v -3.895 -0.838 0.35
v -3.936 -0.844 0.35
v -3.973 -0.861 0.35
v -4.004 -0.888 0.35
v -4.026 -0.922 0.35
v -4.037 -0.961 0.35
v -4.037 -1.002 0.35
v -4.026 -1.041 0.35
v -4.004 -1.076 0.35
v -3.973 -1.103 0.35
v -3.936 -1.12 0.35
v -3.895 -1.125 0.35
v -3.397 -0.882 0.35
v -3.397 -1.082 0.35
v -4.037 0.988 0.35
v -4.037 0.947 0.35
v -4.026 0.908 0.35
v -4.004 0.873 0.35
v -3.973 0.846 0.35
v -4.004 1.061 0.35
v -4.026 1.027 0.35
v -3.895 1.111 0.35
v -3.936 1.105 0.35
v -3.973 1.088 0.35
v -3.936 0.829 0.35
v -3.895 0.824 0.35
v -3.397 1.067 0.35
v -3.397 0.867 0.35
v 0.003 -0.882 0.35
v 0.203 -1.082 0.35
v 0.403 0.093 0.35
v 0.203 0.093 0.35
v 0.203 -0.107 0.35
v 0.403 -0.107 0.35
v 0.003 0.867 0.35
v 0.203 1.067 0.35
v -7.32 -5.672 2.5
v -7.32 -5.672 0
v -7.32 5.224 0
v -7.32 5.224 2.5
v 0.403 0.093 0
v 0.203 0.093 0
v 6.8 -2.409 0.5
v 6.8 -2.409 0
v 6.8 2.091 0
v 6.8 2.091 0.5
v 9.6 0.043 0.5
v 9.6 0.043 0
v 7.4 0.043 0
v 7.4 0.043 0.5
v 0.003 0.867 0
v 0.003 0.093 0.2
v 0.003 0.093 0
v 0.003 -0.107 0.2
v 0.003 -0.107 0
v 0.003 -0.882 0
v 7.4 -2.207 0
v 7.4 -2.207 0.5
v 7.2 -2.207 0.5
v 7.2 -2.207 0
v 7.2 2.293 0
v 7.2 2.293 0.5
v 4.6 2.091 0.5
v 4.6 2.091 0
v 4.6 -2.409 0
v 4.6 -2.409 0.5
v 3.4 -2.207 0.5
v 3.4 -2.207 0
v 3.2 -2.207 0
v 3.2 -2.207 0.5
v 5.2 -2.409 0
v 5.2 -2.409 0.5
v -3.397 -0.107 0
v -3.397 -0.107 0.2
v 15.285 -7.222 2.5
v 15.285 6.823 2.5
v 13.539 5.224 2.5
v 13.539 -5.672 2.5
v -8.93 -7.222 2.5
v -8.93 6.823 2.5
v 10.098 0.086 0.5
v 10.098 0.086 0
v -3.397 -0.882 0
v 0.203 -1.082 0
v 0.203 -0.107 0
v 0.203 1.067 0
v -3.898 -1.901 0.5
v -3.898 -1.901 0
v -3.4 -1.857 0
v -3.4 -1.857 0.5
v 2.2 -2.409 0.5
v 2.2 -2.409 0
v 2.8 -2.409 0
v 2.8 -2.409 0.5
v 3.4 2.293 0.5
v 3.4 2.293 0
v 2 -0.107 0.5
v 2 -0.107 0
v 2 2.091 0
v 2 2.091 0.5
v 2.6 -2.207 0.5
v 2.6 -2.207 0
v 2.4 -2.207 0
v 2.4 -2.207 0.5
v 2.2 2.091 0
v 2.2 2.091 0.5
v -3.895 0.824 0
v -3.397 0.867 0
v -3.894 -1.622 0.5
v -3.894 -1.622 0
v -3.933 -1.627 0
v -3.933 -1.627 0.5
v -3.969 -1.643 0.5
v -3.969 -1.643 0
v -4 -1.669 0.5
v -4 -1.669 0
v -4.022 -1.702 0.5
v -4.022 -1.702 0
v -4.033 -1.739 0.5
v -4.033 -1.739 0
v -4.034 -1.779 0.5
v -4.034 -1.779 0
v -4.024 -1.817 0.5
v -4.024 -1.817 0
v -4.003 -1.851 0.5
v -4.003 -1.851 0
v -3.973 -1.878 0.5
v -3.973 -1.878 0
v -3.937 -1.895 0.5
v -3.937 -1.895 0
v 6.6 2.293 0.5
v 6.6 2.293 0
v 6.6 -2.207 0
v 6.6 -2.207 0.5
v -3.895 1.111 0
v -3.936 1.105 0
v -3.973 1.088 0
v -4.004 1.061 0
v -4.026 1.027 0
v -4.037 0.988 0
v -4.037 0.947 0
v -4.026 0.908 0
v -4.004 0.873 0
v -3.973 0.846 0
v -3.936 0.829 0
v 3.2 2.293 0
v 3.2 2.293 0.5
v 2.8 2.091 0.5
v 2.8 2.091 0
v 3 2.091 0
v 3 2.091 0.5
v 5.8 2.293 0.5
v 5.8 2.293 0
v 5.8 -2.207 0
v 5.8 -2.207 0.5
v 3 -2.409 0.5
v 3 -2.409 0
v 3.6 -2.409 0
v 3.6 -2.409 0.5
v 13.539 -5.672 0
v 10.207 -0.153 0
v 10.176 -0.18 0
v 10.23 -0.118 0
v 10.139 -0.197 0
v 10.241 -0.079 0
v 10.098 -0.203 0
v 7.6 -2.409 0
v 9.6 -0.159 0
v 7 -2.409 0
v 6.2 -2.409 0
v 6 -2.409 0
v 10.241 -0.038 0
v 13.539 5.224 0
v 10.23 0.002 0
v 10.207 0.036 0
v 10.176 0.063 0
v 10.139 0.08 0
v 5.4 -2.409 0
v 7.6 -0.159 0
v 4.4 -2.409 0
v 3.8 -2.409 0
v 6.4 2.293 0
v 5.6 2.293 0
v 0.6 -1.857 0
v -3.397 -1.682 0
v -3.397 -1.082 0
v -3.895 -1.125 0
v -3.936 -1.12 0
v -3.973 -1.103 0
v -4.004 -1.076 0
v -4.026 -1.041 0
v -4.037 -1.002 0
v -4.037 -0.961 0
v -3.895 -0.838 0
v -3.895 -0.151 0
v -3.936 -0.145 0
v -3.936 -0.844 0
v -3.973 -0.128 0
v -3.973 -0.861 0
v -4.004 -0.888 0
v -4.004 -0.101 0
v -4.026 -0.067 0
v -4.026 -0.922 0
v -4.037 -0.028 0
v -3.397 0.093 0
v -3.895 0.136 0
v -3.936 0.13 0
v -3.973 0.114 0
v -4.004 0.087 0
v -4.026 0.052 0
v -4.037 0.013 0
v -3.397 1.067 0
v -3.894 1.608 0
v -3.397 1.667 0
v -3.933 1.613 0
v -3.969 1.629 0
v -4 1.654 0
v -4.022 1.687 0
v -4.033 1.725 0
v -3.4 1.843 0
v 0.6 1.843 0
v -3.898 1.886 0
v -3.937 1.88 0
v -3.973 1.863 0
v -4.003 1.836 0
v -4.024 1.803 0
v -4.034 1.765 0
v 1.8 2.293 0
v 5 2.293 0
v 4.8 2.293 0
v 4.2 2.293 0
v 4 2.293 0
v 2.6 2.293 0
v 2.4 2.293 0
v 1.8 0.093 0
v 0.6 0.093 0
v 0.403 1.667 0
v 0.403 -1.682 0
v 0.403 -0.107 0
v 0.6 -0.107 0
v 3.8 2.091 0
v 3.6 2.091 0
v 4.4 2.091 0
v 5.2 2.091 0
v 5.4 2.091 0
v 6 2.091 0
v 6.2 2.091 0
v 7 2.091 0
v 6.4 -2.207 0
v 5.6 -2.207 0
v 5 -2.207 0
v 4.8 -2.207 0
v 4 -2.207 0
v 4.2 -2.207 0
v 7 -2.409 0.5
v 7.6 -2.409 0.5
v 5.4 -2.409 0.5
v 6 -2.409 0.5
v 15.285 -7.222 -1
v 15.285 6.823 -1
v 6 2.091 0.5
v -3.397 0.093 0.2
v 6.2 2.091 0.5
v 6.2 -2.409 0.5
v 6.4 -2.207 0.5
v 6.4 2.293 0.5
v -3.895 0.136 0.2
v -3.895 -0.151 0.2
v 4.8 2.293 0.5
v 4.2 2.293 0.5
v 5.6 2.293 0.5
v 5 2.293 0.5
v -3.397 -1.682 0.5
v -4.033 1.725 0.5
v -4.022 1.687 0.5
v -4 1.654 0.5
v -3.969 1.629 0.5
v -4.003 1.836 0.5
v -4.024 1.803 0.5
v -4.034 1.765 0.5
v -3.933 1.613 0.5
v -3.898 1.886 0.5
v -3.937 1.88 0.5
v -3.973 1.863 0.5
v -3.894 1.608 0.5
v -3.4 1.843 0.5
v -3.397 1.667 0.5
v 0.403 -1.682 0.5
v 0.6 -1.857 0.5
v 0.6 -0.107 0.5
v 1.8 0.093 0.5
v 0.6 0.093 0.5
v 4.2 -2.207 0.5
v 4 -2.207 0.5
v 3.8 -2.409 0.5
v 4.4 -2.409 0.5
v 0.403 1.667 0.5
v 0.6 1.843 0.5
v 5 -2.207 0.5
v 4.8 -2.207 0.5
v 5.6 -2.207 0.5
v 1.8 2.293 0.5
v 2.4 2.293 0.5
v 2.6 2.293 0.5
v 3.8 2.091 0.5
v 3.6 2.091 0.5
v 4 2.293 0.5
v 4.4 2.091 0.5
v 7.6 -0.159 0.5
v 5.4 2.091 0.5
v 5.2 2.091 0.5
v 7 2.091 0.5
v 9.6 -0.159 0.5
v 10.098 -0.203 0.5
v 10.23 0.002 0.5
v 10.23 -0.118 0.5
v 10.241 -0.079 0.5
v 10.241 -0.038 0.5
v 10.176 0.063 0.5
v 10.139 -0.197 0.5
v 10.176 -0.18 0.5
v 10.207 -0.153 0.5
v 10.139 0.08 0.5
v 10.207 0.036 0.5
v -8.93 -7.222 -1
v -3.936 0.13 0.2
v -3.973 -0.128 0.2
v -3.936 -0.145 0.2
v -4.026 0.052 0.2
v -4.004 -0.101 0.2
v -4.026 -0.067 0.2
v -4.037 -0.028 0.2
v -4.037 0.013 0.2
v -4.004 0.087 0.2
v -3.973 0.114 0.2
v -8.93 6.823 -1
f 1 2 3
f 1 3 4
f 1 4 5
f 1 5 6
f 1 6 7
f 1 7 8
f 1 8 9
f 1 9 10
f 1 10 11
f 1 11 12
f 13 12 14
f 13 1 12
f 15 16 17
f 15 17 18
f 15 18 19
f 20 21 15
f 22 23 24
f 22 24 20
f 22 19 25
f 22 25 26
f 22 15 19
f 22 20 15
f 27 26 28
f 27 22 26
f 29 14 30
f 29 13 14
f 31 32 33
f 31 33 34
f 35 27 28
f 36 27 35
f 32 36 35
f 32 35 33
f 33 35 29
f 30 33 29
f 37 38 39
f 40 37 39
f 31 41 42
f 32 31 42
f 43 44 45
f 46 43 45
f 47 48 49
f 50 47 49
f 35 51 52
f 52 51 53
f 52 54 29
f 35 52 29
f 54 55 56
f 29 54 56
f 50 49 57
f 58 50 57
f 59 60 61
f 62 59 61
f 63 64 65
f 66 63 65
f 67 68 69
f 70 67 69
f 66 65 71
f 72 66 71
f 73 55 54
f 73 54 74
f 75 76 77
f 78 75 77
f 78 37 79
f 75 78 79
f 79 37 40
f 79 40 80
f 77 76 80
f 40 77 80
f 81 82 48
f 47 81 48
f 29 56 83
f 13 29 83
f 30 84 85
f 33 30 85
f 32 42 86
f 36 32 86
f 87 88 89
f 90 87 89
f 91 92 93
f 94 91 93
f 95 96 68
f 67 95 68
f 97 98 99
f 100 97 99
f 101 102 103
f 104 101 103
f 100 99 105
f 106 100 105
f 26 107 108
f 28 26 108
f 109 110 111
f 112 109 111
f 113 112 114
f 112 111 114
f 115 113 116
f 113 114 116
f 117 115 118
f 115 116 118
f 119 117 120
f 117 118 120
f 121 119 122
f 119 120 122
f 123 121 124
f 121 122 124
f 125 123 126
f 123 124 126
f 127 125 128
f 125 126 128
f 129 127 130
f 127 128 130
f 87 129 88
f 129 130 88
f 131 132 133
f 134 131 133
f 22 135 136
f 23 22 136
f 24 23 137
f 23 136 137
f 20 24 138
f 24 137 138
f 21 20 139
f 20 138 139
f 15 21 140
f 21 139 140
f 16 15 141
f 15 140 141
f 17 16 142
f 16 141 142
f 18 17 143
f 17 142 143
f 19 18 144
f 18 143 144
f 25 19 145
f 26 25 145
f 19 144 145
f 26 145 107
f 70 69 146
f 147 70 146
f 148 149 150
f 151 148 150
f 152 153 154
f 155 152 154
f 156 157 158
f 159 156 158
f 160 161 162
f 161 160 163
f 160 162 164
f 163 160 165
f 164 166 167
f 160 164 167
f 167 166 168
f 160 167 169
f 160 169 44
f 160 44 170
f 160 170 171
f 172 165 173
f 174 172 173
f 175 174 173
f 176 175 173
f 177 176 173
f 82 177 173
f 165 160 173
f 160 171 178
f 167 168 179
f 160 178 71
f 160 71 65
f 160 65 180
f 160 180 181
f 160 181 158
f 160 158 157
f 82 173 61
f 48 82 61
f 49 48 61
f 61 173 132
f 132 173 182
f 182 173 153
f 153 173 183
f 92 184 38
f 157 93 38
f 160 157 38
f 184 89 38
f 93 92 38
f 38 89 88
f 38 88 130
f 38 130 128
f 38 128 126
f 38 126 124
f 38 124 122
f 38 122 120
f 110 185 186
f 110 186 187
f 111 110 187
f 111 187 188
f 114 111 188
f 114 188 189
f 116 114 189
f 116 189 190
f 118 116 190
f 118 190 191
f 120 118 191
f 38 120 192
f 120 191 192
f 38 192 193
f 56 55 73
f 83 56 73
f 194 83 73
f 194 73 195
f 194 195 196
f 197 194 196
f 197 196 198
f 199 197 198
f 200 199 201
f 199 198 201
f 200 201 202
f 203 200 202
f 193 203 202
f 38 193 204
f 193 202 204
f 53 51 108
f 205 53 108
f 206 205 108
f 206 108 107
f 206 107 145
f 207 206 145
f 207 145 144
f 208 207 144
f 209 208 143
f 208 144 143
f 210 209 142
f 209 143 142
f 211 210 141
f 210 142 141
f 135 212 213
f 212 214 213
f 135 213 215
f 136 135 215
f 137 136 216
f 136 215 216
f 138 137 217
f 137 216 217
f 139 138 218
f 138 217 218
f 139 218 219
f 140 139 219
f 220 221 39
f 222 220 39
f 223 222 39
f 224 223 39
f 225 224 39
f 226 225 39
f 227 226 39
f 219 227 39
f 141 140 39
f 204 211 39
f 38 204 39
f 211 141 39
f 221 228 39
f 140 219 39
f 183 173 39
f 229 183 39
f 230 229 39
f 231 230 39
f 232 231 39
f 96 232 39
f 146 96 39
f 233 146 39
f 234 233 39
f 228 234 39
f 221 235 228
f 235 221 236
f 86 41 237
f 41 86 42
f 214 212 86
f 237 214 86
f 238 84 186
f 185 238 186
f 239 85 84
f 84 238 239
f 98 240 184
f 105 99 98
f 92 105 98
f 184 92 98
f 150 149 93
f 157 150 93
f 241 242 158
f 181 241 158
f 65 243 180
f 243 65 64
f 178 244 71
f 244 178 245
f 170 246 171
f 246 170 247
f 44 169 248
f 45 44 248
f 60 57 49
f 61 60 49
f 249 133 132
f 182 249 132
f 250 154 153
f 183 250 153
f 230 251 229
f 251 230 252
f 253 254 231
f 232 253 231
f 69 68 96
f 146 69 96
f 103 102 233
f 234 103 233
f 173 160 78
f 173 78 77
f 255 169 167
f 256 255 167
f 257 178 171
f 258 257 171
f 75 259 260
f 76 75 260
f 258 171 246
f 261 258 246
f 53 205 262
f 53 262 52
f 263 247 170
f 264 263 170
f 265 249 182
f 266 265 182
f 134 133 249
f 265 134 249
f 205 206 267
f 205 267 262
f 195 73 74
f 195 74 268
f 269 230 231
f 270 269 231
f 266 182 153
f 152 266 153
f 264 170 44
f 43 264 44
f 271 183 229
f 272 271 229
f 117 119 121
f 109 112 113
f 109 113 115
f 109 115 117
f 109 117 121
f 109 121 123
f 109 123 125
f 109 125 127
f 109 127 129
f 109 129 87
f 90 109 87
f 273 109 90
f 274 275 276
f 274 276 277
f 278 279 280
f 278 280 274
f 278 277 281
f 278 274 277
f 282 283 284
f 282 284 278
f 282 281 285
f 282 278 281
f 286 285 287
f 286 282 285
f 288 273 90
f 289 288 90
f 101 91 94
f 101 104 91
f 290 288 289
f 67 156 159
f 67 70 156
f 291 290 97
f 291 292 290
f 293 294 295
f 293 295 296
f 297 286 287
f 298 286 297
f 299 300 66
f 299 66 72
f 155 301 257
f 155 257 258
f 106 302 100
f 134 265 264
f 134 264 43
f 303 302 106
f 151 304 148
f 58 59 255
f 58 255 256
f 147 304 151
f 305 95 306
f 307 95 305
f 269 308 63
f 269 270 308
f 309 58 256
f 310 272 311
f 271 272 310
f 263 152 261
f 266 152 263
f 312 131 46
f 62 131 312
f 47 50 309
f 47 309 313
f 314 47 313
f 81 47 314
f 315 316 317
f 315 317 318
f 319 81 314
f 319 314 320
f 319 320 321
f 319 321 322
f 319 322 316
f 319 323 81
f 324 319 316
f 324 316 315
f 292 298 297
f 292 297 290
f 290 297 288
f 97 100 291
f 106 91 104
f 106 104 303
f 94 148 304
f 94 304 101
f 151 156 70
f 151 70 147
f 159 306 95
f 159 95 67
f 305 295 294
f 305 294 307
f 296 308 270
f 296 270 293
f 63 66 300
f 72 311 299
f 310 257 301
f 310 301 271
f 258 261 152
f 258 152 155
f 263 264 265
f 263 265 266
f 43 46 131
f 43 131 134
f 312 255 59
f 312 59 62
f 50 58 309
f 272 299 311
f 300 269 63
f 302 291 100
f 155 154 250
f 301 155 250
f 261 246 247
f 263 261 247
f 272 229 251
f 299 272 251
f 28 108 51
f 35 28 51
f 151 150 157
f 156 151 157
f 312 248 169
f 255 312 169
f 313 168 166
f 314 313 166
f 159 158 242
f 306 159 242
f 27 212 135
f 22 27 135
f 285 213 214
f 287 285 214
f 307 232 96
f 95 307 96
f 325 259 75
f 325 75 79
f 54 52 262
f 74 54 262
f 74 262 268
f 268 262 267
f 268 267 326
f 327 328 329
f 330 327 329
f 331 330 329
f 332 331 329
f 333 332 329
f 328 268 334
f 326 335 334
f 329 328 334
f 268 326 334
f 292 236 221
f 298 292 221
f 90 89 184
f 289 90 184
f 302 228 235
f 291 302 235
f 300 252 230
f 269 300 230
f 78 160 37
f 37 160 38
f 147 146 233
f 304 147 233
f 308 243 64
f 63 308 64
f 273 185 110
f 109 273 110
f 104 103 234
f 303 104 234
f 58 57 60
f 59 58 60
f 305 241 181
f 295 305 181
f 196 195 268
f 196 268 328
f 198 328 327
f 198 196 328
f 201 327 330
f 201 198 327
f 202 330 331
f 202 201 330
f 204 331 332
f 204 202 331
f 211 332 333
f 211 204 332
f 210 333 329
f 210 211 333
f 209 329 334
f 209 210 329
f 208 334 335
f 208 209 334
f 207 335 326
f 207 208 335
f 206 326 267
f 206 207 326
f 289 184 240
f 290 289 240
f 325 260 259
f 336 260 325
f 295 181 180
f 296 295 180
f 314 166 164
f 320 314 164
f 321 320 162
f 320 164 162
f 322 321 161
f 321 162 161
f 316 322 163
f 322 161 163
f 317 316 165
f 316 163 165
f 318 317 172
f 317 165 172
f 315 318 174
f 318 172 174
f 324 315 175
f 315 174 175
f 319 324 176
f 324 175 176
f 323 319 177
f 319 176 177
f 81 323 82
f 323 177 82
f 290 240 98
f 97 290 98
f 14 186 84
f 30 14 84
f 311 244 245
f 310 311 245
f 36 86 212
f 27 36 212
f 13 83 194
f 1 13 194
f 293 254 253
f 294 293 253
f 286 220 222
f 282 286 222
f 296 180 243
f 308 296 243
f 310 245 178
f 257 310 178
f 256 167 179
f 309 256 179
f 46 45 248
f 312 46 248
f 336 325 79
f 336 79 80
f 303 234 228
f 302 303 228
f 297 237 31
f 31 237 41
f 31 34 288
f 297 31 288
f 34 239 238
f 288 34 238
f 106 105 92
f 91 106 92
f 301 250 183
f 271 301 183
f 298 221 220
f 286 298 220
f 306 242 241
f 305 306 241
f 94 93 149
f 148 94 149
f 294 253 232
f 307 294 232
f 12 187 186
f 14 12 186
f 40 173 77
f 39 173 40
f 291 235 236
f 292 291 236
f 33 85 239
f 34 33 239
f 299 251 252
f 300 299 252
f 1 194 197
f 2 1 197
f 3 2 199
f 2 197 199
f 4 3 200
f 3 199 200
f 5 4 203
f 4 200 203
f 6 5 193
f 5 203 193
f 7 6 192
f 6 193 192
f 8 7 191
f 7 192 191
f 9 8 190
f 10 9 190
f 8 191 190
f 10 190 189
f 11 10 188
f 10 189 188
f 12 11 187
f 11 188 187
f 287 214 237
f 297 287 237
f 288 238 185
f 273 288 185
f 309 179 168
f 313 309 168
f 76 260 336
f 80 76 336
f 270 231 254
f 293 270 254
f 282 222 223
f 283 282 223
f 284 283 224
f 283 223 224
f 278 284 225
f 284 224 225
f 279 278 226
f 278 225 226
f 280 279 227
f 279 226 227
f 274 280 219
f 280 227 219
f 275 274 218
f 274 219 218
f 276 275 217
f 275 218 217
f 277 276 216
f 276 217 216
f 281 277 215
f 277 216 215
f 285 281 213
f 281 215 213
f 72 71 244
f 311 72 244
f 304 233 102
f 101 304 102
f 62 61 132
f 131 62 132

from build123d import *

# Parameters (mm, degrees)
BOSS_EXTRUDE1_DEPTH = 0.2
BOSS_EXTRUDE2_DEPTH = 0.35
BOSS_EXTRUDE3_DEPTH = 0.5
SKETCH2_W           = 20.858957108
SKETCH2_H           = 10.895771928
BOSS_EXTRUDE4_DEPTH = 1
SKETCH3_W           = 24.214928457
SKETCH3_H           = 14.045107393
SKETCH3_W_2         = 20.858957108
SKETCH3_H_2         = 10.895771928
BOSS_EXTRUDE5_DEPTH = 3.5


with BuildPart() as part:
    # Sketch1 → Boss-Extrude1 (new body)
    with BuildSketch(Plane.XY):
        with BuildLine():
            Line((-3.397107478, 0.09272626), (0.002892522, 0.09272626))
            Line((0.002892522, 0.09272626), (0.002892522, -0.10727374))
            Line((0.002892522, -0.10727374), (-3.397107478, -0.10727374))
            Line((-3.397107478, -0.10727374), (-3.895204827, -0.150851611))
            ThreePointArc((-3.895204827, -0.150851611), (-4.038782699, -0.00727374), (-3.895204827, 0.136304132))
            Line((-3.895204827, 0.136304132), (-3.397107478, 0.09272626))
        make_face()
    extrude(amount=BOSS_EXTRUDE1_DEPTH)

    # Sketch1<4> → Boss-Extrude2 (add)
    with BuildSketch(Plane.XY):
        with BuildLine():
            Line((0.402892522, -0.10727374), (0.402892522, 0.09272626))
            Line((0.402892522, 0.09272626), (0.202892522, 0.09272626))
            Line((0.202892522, 0.09272626), (0.202892522, 1.067220881))
            Line((0.202892522, 1.067220881), (-3.397107478, 1.067220881))
            Line((-3.397107478, 1.067220881), (-3.895204827, 1.110798752))
            ThreePointArc((-3.895204827, 1.110798752), (-4.038782699, 0.967220881), (-3.895204827, 0.82364301))
            Line((-3.895204827, 0.82364301), (-3.397107478, 0.867220881))
            Line((-3.397107478, 0.867220881), (0.002892522, 0.867220881))
            Line((0.002892522, 0.867220881), (0.002892522, 0.09272626))
            Line((0.002892522, 0.09272626), (0.002892522, -0.10727374))
            Line((0.002892522, -0.10727374), (0.002892522, -0.881768361))
            Line((0.002892522, -0.881768361), (-3.397107478, -0.881768361))
            Line((-3.397107478, -0.881768361), (-3.895204827, -0.838190489))
            ThreePointArc((-3.895204827, -0.838190489), (-4.038782699, -0.981768361), (-3.895204827, -1.125346232))
            Line((-3.895204827, -1.125346232), (-3.397107478, -1.081768361))
            Line((-3.397107478, -1.081768361), (0.202892522, -1.081768361))
            Line((0.202892522, -1.081768361), (0.202892522, -0.10727374))
            Line((0.202892522, -0.10727374), (0.402892522, -0.10727374))
        make_face()
    extrude(amount=BOSS_EXTRUDE2_DEPTH)

    # Sketch1<5> → Boss-Extrude3 (add)
    with BuildSketch(Plane.XY):
        with BuildLine():
            Line((1.8, 0.09272626), (0.6, 0.09272626))
            Line((0.6, 0.09272626), (0.6, 1.84272626))
            Line((0.6, 1.84272626), (-3.4, 1.84272626))
            Line((-3.4, 1.84272626), (-3.898097349, 1.886304132))
            ThreePointArc((-3.898097349, 1.886304132), (-4.035149554, 1.744700475), (-3.893545897, 1.607648271))
            Line((-3.893545897, 1.607648271), (-3.397107478, 1.667220881))
            Line((-3.397107478, 1.667220881), (0.402892522, 1.667220881))
            Line((0.402892522, 1.667220881), (0.402892522, -1.681768361))
            Line((0.402892522, -1.681768361), (-3.397107478, -1.681768361))
            Line((-3.397107478, -1.681768361), (-3.893545897, -1.62219575))
            ThreePointArc((-3.893545897, -1.62219575), (-4.035149554, -1.759247955), (-3.898097349, -1.900851611))
            Line((-3.898097349, -1.900851611), (-3.4, -1.85727374))
            Line((-3.4, -1.85727374), (0.6, -1.85727374))
            Line((0.6, -1.85727374), (0.6, -0.10727374))
            Line((0.6, -0.10727374), (2, -0.10727374))
            Line((2, -0.10727374), (2, 2.090619677))
            Line((2, 2.090619677), (2.2, 2.090619677))
            Line((2.2, 2.090619677), (2.2, -2.409380323))
            Line((2.2, -2.409380323), (2.8, -2.409380323))
            Line((2.8, -2.409380323), (2.8, 2.090619677))
            Line((2.8, 2.090619677), (3, 2.090619677))
            Line((3, 2.090619677), (3, -2.409380323))
            Line((3, -2.409380323), (3.6, -2.409380323))
            Line((3.6, -2.409380323), (3.6, 2.090619677))
            Line((3.6, 2.090619677), (3.8, 2.090619677))
            Line((3.8, 2.090619677), (3.8, -2.409380323))
            Line((3.8, -2.409380323), (4.4, -2.409380323))
            Line((4.4, -2.409380323), (4.4, 2.090619677))
            Line((4.4, 2.090619677), (4.6, 2.090619677))
            Line((4.6, 2.090619677), (4.6, -2.409380323))
            Line((4.6, -2.409380323), (5.2, -2.409380323))
            Line((5.2, -2.409380323), (5.2, 2.090619677))
            Line((5.2, 2.090619677), (5.4, 2.090619677))
            Line((5.4, 2.090619677), (5.4, -2.409380323))
            Line((5.4, -2.409380323), (6, -2.409380323))
            Line((6, -2.409380323), (6, 2.090619677))
            Line((6, 2.090619677), (6.2, 2.090619677))
            Line((6.2, 2.090619677), (6.2, -2.409380323))
            Line((6.2, -2.409380323), (6.8, -2.409380323))
            Line((6.8, -2.409380323), (6.8, 2.090619677))
            Line((6.8, 2.090619677), (7, 2.090619677))
            Line((7, 2.090619677), (7, -2.409380323))
            Line((7, -2.409380323), (7.6, -2.409380323))
            Line((7.6, -2.409380323), (7.6, -0.159380323))
            Line((7.6, -0.159380323), (9.6, -0.159380323))
            Line((9.6, -0.159380323), (10.098097349, -0.202958194))
            ThreePointArc((10.098097349, -0.202958194), (10.242728512, -0.058327031), (10.098097349, 0.086304132))
            Line((10.098097349, 0.086304132), (9.6, 0.04272626))
            Line((9.6, 0.04272626), (7.4, 0.04272626))
            Line((7.4, 0.04272626), (7.4, -2.20727374))
            Line((7.4, -2.20727374), (7.2, -2.20727374))
            Line((7.2, -2.20727374), (7.2, 2.29272626))
            Line((7.2, 2.29272626), (6.6, 2.29272626))
            Line((6.6, 2.29272626), (6.6, -2.20727374))
            Line((6.6, -2.20727374), (6.4, -2.20727374))
            Line((6.4, -2.20727374), (6.4, 2.29272626))
            Line((6.4, 2.29272626), (5.8, 2.29272626))
            Line((5.8, 2.29272626), (5.8, -2.20727374))
            Line((5.8, -2.20727374), (5.6, -2.20727374))
            Line((5.6, -2.20727374), (5.6, 2.29272626))
            Line((5.6, 2.29272626), (5, 2.29272626))
            Line((5, 2.29272626), (5, -2.20727374))
            Line((5, -2.20727374), (4.8, -2.20727374))
            Line((4.8, -2.20727374), (4.8, 2.29272626))
            Line((4.8, 2.29272626), (4.2, 2.29272626))
            Line((4.2, 2.29272626), (4.2, -2.20727374))
            Line((4.2, -2.20727374), (4, -2.20727374))
            Line((4, -2.20727374), (4, 2.29272626))
            Line((4, 2.29272626), (3.4, 2.29272626))
            Line((3.4, 2.29272626), (3.4, -2.20727374))
            Line((3.4, -2.20727374), (3.2, -2.20727374))
            Line((3.2, -2.20727374), (3.2, 2.29272626))
            Line((3.2, 2.29272626), (2.6, 2.29272626))
            Line((2.6, 2.29272626), (2.6, -2.20727374))
            Line((2.6, -2.20727374), (2.4, -2.20727374))
            Line((2.4, -2.20727374), (2.4, 2.29272626))
            Line((2.4, 2.29272626), (1.8, 2.29272626))
            Line((1.8, 2.29272626), (1.8, 0.09272626))
        make_face()
    extrude(amount=BOSS_EXTRUDE3_DEPTH)

    # Sketch2 → Boss-Extrude4 (add)
    with BuildSketch(Plane(origin=(0, 0, 0), x_dir=(-1, 0, 0), z_dir=(0, 0, -1))):
        with Locations((-3.109940625, -0.224118245)):
            Rectangle(SKETCH2_W, SKETCH2_H)
    extrude(amount=BOSS_EXTRUDE4_DEPTH)

    # Sketch3 → Boss-Extrude5 (add)
    with BuildSketch(Plane(origin=(0, 0, -1), x_dir=(-1, 0, 0), z_dir=(0, 0, -1))):
        with Locations((-3.177155759, -0.199662359)):
            Rectangle(SKETCH3_W, SKETCH3_H)
        with Locations((-3.109940625, -0.224118245)):
            Rectangle(SKETCH3_W_2, SKETCH3_H_2, mode=Mode.SUBTRACT)
    extrude(amount=-BOSS_EXTRUDE5_DEPTH)


solid = part.part
